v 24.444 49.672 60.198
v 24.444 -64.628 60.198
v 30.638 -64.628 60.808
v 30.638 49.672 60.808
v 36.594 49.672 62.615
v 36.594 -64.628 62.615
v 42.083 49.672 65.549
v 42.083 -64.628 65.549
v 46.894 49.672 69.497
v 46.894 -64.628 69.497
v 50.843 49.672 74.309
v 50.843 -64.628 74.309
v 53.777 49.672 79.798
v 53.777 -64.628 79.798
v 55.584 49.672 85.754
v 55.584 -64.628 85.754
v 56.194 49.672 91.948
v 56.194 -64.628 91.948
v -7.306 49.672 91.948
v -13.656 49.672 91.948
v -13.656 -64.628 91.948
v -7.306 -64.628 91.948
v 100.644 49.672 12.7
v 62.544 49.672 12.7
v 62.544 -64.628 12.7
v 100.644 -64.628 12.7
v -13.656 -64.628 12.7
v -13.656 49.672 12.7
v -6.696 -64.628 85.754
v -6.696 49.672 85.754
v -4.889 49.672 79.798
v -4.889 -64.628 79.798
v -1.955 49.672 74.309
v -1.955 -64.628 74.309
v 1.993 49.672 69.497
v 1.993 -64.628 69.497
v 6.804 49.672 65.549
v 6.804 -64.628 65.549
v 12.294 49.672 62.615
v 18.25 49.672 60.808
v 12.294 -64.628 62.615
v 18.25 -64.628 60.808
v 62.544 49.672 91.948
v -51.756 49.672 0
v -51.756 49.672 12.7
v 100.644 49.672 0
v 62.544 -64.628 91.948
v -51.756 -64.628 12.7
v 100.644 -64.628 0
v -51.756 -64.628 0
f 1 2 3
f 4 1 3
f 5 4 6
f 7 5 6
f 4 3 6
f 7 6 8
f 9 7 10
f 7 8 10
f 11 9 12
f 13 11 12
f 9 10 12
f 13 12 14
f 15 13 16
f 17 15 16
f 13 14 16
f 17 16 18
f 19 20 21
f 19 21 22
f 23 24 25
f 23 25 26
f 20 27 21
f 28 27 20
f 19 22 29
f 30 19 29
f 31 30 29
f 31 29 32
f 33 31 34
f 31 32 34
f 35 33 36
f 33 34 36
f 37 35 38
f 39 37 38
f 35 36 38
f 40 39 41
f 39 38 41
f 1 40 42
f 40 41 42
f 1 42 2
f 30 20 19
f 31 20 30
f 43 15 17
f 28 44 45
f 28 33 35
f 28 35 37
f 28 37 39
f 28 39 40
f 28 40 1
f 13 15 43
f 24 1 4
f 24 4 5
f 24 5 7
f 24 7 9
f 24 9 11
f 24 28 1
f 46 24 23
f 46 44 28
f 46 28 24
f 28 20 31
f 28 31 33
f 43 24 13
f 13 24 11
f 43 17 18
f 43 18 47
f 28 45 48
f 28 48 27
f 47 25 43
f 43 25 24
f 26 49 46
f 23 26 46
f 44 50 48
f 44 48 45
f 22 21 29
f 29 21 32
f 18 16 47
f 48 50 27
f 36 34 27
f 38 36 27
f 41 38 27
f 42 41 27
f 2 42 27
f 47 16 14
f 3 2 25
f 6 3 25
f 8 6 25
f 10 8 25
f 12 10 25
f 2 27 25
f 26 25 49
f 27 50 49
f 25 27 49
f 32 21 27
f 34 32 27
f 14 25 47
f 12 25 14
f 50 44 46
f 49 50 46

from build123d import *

# Parameters (mm, degrees)
F0_W     = 152.4
F0_H     = 114.3
F1_DEPTH = 12.7
F2_W     = 76.2
F2_H     = 114.3
F3_DEPTH = 79.248
F5_DEPTH = 114.301


with BuildPart() as f1:
    # F0 (on Top) → F1 (new body)
    with BuildSketch(Plane.XY):
        with Locations((24.443777, -7.478296)):
            Rectangle(F0_W, F0_H)
    extrude(amount=F1_DEPTH)

    # F2 (on face) → F3 (join)
    with BuildSketch(Plane.XY.offset(12.7)):
        with Locations((24.443777, -7.478296)):
            Rectangle(F2_W, F2_H)
    extrude(amount=F3_DEPTH)

    # F4 (on face) → F5 (cut, through all)
    with BuildSketch(Plane.XZ.offset(64.628296)):
        with BuildLine():
            Line((56.193777, 91.948), (24.443777, 91.948))
            Line((24.443777, 91.948), (24.443777, 60.198))
            ThreePointArc((24.443777, 60.198), (46.894417, 69.49736), (56.193777, 91.948))
        make_face()
        with BuildLine():
            Line((24.443777, 91.948), (-7.306223, 91.948))
            ThreePointArc((-7.306223, 91.948), (1.993136, 69.49736), (24.443777, 60.198))
            Line((24.443777, 60.198), (24.443777, 91.948))
        make_face()
    extrude(amount=-F5_DEPTH, mode=Mode.SUBTRACT)


solid = f1.part
